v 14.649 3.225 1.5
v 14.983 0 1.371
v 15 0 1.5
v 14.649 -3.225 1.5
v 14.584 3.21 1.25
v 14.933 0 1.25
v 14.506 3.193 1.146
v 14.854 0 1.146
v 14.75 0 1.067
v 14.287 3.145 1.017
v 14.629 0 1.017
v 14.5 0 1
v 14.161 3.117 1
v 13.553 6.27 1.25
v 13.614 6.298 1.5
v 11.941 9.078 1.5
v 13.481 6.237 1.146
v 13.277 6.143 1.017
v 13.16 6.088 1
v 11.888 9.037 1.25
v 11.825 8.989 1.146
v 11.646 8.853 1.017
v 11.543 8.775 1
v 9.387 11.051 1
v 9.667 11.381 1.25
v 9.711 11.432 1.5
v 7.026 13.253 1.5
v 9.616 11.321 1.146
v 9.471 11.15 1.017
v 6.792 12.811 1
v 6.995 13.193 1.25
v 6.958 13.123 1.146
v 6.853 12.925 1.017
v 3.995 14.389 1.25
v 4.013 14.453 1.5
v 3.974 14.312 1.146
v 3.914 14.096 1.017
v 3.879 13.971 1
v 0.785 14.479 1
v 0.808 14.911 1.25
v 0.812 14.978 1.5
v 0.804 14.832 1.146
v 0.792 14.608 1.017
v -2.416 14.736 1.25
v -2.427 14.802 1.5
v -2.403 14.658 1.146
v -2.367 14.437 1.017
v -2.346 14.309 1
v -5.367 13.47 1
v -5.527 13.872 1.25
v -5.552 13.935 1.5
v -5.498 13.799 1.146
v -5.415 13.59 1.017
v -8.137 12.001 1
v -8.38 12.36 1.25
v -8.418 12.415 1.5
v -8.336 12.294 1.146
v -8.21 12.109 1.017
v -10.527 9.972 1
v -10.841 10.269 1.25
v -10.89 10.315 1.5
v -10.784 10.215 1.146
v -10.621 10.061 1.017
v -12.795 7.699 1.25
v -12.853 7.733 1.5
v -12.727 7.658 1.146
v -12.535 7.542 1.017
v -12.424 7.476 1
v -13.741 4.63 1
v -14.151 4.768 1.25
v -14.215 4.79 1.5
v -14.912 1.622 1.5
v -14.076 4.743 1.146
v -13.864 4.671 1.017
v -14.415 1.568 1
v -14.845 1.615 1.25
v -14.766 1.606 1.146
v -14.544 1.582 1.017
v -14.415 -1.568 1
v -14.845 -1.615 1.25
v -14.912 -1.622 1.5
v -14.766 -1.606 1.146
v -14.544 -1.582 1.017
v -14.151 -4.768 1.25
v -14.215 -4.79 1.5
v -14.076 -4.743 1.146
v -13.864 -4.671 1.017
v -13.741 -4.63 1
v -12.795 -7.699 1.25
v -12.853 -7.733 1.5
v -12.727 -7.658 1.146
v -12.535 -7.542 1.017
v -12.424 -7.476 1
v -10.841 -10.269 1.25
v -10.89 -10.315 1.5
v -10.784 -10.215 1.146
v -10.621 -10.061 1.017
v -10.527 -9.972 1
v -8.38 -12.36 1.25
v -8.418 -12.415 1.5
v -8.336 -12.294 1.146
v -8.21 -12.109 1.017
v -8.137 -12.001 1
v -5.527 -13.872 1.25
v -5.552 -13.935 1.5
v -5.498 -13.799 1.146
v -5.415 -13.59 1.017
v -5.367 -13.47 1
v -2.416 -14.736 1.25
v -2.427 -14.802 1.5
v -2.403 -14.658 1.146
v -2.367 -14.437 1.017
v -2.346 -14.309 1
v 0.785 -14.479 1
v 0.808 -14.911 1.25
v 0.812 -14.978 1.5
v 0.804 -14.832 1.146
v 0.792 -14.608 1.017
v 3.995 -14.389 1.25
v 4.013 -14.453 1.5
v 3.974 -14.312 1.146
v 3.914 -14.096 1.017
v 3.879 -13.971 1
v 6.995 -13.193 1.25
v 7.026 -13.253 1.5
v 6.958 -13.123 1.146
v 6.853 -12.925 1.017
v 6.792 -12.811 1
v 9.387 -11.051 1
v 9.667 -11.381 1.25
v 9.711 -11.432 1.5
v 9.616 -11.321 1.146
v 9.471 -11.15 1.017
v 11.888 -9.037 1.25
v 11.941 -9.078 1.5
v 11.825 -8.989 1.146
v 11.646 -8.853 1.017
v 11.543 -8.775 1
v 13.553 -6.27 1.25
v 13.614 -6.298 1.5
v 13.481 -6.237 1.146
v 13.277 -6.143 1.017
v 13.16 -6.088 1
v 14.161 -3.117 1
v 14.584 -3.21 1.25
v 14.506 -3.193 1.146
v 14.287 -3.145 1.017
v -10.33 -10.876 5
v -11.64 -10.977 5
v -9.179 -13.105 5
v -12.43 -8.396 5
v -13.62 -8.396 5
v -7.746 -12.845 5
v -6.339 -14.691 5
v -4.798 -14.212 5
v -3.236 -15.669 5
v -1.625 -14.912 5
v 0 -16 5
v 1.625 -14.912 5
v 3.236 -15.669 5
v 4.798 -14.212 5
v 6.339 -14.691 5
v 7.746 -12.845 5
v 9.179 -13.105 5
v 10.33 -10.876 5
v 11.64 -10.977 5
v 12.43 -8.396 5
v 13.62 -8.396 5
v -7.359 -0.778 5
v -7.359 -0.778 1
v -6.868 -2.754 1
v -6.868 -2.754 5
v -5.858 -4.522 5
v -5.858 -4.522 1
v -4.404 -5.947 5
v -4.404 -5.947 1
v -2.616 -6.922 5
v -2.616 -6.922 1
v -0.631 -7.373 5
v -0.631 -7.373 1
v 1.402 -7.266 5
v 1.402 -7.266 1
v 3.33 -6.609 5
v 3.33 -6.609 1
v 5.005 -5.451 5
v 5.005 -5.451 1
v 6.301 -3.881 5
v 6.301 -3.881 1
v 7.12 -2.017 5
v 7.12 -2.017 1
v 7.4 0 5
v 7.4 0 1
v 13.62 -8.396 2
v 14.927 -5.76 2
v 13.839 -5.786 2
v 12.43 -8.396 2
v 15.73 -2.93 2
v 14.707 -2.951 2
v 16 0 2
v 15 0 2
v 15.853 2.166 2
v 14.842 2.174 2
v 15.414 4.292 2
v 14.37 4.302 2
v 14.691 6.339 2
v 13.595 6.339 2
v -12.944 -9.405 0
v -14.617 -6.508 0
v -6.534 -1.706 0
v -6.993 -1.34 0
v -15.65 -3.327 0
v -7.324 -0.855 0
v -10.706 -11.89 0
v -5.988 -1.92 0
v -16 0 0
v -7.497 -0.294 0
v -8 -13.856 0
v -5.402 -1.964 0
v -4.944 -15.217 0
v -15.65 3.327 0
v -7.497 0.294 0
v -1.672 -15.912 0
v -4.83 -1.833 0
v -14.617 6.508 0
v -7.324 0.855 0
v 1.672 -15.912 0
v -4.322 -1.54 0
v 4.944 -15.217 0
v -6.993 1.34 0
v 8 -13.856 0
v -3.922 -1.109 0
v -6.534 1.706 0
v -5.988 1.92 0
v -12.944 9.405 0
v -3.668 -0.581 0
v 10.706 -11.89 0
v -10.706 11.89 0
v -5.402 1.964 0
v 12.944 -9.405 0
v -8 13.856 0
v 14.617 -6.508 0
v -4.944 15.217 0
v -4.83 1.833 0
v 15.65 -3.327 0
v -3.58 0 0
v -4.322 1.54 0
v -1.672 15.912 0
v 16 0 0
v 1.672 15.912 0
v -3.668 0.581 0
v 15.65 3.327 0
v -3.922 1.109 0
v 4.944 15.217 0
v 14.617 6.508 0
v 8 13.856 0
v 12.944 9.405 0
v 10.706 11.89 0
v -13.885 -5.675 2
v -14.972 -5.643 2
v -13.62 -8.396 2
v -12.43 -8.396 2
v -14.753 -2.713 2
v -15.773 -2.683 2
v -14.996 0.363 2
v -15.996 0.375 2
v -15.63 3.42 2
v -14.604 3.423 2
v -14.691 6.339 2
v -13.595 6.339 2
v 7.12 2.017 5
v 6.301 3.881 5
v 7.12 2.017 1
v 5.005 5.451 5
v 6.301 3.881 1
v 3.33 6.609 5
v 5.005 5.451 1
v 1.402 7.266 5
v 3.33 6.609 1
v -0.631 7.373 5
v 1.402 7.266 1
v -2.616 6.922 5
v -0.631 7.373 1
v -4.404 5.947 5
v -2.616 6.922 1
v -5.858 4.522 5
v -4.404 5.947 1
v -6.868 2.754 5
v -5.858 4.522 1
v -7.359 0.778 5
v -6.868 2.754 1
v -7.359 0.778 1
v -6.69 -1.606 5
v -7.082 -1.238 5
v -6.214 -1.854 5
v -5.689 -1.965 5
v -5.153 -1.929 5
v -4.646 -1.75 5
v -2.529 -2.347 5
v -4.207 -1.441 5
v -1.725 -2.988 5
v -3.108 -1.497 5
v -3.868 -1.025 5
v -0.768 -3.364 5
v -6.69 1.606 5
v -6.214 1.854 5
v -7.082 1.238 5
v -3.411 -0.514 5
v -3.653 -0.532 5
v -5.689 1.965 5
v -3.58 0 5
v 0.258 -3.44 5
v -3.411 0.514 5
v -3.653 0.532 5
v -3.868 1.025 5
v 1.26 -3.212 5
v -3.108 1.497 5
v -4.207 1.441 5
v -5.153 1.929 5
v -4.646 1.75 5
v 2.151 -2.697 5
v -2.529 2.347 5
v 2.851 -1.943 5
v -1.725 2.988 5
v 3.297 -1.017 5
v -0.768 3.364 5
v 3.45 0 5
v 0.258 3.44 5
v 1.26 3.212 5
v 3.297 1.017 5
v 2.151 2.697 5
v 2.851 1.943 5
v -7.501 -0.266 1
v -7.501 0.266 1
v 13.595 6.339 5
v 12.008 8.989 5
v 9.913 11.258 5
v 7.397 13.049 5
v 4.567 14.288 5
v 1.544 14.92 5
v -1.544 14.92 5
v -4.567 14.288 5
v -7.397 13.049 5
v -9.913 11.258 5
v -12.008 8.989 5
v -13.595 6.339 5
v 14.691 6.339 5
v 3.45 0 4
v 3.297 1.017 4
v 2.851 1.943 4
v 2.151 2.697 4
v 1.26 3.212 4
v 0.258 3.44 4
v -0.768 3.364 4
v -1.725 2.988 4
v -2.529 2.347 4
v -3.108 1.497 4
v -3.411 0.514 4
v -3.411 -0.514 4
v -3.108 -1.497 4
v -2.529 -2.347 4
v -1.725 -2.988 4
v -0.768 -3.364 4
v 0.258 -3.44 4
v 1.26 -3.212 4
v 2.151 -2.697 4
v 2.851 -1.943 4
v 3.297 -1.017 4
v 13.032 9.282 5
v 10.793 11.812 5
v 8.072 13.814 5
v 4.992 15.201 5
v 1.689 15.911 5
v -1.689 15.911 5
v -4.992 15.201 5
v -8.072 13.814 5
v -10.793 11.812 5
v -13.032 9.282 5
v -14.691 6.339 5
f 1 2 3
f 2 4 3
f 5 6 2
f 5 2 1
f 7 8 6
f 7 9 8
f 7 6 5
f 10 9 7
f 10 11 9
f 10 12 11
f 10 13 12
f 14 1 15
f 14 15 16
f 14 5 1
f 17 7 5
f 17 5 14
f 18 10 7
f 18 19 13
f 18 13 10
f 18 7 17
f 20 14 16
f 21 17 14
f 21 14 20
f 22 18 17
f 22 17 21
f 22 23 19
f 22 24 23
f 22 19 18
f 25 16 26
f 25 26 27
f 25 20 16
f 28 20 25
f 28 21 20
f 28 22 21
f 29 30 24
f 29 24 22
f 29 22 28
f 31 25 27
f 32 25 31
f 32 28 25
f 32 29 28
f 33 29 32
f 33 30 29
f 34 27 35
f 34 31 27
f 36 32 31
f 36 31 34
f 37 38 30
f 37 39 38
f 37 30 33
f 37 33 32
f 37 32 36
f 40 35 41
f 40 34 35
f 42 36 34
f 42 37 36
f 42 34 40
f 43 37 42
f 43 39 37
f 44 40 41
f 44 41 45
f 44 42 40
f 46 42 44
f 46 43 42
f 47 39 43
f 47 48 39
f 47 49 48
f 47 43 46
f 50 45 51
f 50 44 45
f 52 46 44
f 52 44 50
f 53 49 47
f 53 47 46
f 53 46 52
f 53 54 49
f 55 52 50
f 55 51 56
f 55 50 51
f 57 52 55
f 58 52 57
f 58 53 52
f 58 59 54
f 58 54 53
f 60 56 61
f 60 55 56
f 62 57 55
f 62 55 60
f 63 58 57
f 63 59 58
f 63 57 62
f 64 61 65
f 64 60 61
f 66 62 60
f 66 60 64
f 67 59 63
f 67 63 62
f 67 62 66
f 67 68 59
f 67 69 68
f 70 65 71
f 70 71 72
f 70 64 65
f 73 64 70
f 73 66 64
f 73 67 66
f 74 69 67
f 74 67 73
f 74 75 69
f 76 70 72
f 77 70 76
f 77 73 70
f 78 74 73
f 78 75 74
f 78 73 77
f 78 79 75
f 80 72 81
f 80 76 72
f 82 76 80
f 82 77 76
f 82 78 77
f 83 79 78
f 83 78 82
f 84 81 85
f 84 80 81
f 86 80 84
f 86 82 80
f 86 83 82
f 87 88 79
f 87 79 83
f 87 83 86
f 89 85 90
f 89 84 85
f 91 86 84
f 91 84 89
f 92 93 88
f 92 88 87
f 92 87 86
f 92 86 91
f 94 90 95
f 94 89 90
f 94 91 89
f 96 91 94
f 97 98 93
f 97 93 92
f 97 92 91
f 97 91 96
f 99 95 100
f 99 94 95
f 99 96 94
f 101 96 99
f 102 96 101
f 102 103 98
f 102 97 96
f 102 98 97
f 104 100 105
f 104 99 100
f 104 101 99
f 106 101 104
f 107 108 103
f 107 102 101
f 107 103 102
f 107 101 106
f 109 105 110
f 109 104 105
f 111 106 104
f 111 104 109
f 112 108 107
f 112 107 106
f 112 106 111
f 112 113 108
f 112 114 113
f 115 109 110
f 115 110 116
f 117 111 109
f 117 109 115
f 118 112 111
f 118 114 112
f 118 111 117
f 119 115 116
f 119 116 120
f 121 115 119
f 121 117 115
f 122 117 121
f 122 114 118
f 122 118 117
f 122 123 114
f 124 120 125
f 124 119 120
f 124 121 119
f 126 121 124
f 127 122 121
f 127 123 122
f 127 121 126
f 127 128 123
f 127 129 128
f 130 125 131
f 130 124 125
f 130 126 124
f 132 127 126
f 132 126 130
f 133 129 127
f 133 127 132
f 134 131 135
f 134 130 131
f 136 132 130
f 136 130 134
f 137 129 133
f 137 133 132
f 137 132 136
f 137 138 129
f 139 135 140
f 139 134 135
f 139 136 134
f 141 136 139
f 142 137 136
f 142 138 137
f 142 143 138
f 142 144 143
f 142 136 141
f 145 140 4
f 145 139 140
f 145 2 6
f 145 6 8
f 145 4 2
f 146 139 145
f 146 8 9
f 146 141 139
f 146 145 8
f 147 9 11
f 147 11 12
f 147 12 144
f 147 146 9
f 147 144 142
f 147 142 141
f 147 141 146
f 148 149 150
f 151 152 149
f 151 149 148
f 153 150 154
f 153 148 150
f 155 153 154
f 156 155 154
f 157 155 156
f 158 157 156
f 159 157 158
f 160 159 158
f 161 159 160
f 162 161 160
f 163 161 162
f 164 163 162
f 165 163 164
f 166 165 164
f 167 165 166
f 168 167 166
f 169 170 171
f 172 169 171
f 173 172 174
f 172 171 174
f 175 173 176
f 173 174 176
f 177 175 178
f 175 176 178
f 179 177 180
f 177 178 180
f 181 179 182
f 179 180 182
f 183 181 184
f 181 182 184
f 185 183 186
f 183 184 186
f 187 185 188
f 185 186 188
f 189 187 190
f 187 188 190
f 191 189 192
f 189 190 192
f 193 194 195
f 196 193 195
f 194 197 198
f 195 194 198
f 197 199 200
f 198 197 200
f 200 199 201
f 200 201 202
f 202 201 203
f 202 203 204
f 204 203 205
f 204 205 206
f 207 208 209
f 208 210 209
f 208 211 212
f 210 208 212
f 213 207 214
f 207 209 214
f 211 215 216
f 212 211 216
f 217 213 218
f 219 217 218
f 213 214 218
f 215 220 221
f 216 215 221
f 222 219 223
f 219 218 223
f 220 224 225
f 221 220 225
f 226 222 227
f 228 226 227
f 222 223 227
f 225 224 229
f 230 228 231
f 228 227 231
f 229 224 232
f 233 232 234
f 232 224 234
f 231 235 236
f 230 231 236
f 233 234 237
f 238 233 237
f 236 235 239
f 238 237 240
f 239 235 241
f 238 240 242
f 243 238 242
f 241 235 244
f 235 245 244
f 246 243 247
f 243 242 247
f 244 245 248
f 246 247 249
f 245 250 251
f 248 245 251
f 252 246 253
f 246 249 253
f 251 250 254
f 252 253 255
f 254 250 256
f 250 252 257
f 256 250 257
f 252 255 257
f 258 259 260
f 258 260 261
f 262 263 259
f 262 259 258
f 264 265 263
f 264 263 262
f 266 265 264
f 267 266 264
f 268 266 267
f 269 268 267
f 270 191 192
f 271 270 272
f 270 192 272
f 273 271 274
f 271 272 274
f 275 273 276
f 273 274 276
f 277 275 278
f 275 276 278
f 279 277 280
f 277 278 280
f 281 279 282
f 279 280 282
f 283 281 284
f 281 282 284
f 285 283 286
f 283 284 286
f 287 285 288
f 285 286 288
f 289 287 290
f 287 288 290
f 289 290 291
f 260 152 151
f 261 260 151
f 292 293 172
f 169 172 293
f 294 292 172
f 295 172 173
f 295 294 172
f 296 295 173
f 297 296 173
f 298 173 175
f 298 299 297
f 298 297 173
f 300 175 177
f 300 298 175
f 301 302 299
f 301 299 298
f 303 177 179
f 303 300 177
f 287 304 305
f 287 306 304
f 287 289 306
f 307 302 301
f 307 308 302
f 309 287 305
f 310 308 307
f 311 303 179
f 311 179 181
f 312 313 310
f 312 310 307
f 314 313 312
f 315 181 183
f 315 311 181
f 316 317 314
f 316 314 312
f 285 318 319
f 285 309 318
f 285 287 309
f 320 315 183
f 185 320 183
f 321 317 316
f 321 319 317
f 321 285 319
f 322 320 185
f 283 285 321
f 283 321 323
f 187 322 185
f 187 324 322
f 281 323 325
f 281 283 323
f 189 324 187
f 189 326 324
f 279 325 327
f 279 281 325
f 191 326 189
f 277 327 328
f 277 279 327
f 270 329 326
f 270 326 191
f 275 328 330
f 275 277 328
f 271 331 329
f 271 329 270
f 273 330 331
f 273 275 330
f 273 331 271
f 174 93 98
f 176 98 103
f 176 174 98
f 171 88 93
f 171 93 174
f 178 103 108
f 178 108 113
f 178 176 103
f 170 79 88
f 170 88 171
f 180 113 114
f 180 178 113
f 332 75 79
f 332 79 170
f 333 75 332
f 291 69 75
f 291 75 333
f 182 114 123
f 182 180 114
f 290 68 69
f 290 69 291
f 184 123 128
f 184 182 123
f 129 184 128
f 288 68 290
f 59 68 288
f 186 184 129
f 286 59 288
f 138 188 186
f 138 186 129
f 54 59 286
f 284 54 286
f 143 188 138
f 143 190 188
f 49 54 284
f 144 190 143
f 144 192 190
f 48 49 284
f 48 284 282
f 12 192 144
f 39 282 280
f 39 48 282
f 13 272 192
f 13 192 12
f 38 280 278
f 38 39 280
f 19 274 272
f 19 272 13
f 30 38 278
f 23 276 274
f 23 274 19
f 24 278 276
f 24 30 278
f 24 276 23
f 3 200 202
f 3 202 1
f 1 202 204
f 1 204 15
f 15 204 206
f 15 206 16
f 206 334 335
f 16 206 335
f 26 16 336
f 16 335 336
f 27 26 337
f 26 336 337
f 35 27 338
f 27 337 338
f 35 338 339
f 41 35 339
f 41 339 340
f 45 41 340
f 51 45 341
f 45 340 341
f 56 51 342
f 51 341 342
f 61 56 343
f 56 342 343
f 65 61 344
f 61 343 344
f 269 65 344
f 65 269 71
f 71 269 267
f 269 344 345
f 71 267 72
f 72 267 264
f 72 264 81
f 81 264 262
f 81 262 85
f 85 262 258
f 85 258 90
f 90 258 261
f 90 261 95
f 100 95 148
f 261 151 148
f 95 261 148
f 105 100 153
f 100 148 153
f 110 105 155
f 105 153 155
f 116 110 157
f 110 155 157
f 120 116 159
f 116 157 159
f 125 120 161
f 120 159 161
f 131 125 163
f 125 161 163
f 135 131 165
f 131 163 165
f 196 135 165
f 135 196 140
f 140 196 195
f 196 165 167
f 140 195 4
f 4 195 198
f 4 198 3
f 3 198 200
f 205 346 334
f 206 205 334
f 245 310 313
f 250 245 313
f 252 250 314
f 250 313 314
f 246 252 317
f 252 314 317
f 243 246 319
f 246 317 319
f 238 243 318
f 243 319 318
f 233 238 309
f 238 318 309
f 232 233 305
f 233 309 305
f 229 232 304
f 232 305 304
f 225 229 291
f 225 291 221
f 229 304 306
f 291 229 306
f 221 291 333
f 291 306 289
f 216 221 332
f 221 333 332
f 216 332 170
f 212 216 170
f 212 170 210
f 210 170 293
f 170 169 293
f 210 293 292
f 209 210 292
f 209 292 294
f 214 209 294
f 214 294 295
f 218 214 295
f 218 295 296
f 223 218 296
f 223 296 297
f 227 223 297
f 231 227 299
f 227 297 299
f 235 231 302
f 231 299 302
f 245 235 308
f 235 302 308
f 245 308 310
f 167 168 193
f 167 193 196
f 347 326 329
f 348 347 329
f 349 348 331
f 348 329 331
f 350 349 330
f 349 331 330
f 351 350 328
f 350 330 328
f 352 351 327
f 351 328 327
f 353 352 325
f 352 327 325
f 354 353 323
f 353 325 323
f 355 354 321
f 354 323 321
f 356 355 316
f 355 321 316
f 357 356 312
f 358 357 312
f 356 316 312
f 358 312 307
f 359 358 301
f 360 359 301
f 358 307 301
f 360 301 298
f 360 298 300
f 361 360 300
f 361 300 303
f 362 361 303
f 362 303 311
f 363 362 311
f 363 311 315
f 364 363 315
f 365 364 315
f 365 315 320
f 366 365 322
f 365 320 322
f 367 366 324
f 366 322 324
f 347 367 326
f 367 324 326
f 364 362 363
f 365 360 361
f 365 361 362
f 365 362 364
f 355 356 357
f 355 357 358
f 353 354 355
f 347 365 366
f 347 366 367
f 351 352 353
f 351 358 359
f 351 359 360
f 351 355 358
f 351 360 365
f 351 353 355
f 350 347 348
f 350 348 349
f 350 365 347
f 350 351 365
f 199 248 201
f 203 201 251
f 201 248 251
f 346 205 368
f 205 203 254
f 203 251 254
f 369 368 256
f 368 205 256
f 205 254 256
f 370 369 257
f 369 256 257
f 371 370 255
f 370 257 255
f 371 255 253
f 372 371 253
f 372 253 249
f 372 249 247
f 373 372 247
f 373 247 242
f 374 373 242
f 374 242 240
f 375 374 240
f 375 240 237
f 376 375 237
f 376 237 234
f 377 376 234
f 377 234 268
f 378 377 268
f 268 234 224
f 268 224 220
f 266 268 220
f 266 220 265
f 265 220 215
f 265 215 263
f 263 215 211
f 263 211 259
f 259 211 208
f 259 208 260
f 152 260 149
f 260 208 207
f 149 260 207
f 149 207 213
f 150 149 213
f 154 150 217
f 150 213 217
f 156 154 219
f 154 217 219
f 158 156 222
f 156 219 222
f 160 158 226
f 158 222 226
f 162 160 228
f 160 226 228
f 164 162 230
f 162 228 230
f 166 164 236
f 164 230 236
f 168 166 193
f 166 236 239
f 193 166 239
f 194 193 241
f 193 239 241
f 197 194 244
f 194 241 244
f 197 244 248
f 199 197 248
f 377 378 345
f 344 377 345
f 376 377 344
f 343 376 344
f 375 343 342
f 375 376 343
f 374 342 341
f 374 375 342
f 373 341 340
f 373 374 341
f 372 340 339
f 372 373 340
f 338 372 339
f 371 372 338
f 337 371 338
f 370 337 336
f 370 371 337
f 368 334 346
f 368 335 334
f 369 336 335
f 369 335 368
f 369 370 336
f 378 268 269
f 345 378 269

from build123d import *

# Parameters (mm, degrees)
SKETCH1_R           = 16
BOSS_EXTRUDE1_DEPTH = 5
SKETCH3_R           = 15
CUT_EXTRUDE1_DEPTH  = 4
FILLET1_R           = 0.5
SKETCH7_W           = 5.268501054
SKETCH7_H           = 14.735182388
CUT_EXTRUDE2_DEPTH  = 11
SKETCH8_R           = 7.4
BOSS_EXTRUDE2_DEPTH = 4
SKETCH9_R           = 3.45
CUT_EXTRUDE3_DEPTH  = 1
SKETCH11_R          = 1.969447503
CUT_EXTRUDE4_DEPTH  = 10


with BuildPart() as part:
    # Sketch1 → Boss-Extrude1 (new body)
    with BuildSketch(Plane.XY):
        Circle(SKETCH1_R)
    extrude(amount=BOSS_EXTRUDE1_DEPTH)

    # Sketch3 → Cut-Extrude1 (cut)
    with BuildSketch(Plane.XY.offset(5)):
        Circle(SKETCH3_R)
    extrude(amount=-CUT_EXTRUDE1_DEPTH, mode=Mode.SUBTRACT)

    # Fillet1
    fillet1_edges = [part.edges().sort_by_distance(p)[0] for p in [
        (-15, 0, 1),
    ]]
    fillet(fillet1_edges, radius=FILLET1_R)

    # Sketch7 → Cut-Extrude2 (cut)
    with BuildSketch(Plane.XY.offset(13)):
        with Locations((-14.456252894, -1.028256592)):
            Rectangle(SKETCH7_W, SKETCH7_H)
    cut_extrude2 = extrude(amount=-CUT_EXTRUDE2_DEPTH, mode=Mode.SUBTRACT)

    # Mirror1: Cut-Extrude2 across plane
    add(cut_extrude2.mirror(Plane(origin=(0, 0, 0), x_dir=(0, 0, 1), z_dir=(1, 0, 0))), mode=Mode.SUBTRACT)

    # Sketch8 → Boss-Extrude2 (add)
    with BuildSketch(Plane.XY.offset(1)):
        Circle(SKETCH8_R)
    extrude(amount=BOSS_EXTRUDE2_DEPTH)

    # Sketch9 → Cut-Extrude3 (cut)
    with BuildSketch(Plane.XY.offset(5)):
        Circle(SKETCH9_R)
    extrude(amount=-CUT_EXTRUDE3_DEPTH, mode=Mode.SUBTRACT)

    # Sketch11 → Cut-Extrude4 (cut)
    with BuildSketch(Plane.XY.offset(5)):
        with Locations((-5.549660814, 0)):
            Circle(SKETCH11_R)
    extrude(amount=-CUT_EXTRUDE4_DEPTH, mode=Mode.SUBTRACT)


solid = part.part
